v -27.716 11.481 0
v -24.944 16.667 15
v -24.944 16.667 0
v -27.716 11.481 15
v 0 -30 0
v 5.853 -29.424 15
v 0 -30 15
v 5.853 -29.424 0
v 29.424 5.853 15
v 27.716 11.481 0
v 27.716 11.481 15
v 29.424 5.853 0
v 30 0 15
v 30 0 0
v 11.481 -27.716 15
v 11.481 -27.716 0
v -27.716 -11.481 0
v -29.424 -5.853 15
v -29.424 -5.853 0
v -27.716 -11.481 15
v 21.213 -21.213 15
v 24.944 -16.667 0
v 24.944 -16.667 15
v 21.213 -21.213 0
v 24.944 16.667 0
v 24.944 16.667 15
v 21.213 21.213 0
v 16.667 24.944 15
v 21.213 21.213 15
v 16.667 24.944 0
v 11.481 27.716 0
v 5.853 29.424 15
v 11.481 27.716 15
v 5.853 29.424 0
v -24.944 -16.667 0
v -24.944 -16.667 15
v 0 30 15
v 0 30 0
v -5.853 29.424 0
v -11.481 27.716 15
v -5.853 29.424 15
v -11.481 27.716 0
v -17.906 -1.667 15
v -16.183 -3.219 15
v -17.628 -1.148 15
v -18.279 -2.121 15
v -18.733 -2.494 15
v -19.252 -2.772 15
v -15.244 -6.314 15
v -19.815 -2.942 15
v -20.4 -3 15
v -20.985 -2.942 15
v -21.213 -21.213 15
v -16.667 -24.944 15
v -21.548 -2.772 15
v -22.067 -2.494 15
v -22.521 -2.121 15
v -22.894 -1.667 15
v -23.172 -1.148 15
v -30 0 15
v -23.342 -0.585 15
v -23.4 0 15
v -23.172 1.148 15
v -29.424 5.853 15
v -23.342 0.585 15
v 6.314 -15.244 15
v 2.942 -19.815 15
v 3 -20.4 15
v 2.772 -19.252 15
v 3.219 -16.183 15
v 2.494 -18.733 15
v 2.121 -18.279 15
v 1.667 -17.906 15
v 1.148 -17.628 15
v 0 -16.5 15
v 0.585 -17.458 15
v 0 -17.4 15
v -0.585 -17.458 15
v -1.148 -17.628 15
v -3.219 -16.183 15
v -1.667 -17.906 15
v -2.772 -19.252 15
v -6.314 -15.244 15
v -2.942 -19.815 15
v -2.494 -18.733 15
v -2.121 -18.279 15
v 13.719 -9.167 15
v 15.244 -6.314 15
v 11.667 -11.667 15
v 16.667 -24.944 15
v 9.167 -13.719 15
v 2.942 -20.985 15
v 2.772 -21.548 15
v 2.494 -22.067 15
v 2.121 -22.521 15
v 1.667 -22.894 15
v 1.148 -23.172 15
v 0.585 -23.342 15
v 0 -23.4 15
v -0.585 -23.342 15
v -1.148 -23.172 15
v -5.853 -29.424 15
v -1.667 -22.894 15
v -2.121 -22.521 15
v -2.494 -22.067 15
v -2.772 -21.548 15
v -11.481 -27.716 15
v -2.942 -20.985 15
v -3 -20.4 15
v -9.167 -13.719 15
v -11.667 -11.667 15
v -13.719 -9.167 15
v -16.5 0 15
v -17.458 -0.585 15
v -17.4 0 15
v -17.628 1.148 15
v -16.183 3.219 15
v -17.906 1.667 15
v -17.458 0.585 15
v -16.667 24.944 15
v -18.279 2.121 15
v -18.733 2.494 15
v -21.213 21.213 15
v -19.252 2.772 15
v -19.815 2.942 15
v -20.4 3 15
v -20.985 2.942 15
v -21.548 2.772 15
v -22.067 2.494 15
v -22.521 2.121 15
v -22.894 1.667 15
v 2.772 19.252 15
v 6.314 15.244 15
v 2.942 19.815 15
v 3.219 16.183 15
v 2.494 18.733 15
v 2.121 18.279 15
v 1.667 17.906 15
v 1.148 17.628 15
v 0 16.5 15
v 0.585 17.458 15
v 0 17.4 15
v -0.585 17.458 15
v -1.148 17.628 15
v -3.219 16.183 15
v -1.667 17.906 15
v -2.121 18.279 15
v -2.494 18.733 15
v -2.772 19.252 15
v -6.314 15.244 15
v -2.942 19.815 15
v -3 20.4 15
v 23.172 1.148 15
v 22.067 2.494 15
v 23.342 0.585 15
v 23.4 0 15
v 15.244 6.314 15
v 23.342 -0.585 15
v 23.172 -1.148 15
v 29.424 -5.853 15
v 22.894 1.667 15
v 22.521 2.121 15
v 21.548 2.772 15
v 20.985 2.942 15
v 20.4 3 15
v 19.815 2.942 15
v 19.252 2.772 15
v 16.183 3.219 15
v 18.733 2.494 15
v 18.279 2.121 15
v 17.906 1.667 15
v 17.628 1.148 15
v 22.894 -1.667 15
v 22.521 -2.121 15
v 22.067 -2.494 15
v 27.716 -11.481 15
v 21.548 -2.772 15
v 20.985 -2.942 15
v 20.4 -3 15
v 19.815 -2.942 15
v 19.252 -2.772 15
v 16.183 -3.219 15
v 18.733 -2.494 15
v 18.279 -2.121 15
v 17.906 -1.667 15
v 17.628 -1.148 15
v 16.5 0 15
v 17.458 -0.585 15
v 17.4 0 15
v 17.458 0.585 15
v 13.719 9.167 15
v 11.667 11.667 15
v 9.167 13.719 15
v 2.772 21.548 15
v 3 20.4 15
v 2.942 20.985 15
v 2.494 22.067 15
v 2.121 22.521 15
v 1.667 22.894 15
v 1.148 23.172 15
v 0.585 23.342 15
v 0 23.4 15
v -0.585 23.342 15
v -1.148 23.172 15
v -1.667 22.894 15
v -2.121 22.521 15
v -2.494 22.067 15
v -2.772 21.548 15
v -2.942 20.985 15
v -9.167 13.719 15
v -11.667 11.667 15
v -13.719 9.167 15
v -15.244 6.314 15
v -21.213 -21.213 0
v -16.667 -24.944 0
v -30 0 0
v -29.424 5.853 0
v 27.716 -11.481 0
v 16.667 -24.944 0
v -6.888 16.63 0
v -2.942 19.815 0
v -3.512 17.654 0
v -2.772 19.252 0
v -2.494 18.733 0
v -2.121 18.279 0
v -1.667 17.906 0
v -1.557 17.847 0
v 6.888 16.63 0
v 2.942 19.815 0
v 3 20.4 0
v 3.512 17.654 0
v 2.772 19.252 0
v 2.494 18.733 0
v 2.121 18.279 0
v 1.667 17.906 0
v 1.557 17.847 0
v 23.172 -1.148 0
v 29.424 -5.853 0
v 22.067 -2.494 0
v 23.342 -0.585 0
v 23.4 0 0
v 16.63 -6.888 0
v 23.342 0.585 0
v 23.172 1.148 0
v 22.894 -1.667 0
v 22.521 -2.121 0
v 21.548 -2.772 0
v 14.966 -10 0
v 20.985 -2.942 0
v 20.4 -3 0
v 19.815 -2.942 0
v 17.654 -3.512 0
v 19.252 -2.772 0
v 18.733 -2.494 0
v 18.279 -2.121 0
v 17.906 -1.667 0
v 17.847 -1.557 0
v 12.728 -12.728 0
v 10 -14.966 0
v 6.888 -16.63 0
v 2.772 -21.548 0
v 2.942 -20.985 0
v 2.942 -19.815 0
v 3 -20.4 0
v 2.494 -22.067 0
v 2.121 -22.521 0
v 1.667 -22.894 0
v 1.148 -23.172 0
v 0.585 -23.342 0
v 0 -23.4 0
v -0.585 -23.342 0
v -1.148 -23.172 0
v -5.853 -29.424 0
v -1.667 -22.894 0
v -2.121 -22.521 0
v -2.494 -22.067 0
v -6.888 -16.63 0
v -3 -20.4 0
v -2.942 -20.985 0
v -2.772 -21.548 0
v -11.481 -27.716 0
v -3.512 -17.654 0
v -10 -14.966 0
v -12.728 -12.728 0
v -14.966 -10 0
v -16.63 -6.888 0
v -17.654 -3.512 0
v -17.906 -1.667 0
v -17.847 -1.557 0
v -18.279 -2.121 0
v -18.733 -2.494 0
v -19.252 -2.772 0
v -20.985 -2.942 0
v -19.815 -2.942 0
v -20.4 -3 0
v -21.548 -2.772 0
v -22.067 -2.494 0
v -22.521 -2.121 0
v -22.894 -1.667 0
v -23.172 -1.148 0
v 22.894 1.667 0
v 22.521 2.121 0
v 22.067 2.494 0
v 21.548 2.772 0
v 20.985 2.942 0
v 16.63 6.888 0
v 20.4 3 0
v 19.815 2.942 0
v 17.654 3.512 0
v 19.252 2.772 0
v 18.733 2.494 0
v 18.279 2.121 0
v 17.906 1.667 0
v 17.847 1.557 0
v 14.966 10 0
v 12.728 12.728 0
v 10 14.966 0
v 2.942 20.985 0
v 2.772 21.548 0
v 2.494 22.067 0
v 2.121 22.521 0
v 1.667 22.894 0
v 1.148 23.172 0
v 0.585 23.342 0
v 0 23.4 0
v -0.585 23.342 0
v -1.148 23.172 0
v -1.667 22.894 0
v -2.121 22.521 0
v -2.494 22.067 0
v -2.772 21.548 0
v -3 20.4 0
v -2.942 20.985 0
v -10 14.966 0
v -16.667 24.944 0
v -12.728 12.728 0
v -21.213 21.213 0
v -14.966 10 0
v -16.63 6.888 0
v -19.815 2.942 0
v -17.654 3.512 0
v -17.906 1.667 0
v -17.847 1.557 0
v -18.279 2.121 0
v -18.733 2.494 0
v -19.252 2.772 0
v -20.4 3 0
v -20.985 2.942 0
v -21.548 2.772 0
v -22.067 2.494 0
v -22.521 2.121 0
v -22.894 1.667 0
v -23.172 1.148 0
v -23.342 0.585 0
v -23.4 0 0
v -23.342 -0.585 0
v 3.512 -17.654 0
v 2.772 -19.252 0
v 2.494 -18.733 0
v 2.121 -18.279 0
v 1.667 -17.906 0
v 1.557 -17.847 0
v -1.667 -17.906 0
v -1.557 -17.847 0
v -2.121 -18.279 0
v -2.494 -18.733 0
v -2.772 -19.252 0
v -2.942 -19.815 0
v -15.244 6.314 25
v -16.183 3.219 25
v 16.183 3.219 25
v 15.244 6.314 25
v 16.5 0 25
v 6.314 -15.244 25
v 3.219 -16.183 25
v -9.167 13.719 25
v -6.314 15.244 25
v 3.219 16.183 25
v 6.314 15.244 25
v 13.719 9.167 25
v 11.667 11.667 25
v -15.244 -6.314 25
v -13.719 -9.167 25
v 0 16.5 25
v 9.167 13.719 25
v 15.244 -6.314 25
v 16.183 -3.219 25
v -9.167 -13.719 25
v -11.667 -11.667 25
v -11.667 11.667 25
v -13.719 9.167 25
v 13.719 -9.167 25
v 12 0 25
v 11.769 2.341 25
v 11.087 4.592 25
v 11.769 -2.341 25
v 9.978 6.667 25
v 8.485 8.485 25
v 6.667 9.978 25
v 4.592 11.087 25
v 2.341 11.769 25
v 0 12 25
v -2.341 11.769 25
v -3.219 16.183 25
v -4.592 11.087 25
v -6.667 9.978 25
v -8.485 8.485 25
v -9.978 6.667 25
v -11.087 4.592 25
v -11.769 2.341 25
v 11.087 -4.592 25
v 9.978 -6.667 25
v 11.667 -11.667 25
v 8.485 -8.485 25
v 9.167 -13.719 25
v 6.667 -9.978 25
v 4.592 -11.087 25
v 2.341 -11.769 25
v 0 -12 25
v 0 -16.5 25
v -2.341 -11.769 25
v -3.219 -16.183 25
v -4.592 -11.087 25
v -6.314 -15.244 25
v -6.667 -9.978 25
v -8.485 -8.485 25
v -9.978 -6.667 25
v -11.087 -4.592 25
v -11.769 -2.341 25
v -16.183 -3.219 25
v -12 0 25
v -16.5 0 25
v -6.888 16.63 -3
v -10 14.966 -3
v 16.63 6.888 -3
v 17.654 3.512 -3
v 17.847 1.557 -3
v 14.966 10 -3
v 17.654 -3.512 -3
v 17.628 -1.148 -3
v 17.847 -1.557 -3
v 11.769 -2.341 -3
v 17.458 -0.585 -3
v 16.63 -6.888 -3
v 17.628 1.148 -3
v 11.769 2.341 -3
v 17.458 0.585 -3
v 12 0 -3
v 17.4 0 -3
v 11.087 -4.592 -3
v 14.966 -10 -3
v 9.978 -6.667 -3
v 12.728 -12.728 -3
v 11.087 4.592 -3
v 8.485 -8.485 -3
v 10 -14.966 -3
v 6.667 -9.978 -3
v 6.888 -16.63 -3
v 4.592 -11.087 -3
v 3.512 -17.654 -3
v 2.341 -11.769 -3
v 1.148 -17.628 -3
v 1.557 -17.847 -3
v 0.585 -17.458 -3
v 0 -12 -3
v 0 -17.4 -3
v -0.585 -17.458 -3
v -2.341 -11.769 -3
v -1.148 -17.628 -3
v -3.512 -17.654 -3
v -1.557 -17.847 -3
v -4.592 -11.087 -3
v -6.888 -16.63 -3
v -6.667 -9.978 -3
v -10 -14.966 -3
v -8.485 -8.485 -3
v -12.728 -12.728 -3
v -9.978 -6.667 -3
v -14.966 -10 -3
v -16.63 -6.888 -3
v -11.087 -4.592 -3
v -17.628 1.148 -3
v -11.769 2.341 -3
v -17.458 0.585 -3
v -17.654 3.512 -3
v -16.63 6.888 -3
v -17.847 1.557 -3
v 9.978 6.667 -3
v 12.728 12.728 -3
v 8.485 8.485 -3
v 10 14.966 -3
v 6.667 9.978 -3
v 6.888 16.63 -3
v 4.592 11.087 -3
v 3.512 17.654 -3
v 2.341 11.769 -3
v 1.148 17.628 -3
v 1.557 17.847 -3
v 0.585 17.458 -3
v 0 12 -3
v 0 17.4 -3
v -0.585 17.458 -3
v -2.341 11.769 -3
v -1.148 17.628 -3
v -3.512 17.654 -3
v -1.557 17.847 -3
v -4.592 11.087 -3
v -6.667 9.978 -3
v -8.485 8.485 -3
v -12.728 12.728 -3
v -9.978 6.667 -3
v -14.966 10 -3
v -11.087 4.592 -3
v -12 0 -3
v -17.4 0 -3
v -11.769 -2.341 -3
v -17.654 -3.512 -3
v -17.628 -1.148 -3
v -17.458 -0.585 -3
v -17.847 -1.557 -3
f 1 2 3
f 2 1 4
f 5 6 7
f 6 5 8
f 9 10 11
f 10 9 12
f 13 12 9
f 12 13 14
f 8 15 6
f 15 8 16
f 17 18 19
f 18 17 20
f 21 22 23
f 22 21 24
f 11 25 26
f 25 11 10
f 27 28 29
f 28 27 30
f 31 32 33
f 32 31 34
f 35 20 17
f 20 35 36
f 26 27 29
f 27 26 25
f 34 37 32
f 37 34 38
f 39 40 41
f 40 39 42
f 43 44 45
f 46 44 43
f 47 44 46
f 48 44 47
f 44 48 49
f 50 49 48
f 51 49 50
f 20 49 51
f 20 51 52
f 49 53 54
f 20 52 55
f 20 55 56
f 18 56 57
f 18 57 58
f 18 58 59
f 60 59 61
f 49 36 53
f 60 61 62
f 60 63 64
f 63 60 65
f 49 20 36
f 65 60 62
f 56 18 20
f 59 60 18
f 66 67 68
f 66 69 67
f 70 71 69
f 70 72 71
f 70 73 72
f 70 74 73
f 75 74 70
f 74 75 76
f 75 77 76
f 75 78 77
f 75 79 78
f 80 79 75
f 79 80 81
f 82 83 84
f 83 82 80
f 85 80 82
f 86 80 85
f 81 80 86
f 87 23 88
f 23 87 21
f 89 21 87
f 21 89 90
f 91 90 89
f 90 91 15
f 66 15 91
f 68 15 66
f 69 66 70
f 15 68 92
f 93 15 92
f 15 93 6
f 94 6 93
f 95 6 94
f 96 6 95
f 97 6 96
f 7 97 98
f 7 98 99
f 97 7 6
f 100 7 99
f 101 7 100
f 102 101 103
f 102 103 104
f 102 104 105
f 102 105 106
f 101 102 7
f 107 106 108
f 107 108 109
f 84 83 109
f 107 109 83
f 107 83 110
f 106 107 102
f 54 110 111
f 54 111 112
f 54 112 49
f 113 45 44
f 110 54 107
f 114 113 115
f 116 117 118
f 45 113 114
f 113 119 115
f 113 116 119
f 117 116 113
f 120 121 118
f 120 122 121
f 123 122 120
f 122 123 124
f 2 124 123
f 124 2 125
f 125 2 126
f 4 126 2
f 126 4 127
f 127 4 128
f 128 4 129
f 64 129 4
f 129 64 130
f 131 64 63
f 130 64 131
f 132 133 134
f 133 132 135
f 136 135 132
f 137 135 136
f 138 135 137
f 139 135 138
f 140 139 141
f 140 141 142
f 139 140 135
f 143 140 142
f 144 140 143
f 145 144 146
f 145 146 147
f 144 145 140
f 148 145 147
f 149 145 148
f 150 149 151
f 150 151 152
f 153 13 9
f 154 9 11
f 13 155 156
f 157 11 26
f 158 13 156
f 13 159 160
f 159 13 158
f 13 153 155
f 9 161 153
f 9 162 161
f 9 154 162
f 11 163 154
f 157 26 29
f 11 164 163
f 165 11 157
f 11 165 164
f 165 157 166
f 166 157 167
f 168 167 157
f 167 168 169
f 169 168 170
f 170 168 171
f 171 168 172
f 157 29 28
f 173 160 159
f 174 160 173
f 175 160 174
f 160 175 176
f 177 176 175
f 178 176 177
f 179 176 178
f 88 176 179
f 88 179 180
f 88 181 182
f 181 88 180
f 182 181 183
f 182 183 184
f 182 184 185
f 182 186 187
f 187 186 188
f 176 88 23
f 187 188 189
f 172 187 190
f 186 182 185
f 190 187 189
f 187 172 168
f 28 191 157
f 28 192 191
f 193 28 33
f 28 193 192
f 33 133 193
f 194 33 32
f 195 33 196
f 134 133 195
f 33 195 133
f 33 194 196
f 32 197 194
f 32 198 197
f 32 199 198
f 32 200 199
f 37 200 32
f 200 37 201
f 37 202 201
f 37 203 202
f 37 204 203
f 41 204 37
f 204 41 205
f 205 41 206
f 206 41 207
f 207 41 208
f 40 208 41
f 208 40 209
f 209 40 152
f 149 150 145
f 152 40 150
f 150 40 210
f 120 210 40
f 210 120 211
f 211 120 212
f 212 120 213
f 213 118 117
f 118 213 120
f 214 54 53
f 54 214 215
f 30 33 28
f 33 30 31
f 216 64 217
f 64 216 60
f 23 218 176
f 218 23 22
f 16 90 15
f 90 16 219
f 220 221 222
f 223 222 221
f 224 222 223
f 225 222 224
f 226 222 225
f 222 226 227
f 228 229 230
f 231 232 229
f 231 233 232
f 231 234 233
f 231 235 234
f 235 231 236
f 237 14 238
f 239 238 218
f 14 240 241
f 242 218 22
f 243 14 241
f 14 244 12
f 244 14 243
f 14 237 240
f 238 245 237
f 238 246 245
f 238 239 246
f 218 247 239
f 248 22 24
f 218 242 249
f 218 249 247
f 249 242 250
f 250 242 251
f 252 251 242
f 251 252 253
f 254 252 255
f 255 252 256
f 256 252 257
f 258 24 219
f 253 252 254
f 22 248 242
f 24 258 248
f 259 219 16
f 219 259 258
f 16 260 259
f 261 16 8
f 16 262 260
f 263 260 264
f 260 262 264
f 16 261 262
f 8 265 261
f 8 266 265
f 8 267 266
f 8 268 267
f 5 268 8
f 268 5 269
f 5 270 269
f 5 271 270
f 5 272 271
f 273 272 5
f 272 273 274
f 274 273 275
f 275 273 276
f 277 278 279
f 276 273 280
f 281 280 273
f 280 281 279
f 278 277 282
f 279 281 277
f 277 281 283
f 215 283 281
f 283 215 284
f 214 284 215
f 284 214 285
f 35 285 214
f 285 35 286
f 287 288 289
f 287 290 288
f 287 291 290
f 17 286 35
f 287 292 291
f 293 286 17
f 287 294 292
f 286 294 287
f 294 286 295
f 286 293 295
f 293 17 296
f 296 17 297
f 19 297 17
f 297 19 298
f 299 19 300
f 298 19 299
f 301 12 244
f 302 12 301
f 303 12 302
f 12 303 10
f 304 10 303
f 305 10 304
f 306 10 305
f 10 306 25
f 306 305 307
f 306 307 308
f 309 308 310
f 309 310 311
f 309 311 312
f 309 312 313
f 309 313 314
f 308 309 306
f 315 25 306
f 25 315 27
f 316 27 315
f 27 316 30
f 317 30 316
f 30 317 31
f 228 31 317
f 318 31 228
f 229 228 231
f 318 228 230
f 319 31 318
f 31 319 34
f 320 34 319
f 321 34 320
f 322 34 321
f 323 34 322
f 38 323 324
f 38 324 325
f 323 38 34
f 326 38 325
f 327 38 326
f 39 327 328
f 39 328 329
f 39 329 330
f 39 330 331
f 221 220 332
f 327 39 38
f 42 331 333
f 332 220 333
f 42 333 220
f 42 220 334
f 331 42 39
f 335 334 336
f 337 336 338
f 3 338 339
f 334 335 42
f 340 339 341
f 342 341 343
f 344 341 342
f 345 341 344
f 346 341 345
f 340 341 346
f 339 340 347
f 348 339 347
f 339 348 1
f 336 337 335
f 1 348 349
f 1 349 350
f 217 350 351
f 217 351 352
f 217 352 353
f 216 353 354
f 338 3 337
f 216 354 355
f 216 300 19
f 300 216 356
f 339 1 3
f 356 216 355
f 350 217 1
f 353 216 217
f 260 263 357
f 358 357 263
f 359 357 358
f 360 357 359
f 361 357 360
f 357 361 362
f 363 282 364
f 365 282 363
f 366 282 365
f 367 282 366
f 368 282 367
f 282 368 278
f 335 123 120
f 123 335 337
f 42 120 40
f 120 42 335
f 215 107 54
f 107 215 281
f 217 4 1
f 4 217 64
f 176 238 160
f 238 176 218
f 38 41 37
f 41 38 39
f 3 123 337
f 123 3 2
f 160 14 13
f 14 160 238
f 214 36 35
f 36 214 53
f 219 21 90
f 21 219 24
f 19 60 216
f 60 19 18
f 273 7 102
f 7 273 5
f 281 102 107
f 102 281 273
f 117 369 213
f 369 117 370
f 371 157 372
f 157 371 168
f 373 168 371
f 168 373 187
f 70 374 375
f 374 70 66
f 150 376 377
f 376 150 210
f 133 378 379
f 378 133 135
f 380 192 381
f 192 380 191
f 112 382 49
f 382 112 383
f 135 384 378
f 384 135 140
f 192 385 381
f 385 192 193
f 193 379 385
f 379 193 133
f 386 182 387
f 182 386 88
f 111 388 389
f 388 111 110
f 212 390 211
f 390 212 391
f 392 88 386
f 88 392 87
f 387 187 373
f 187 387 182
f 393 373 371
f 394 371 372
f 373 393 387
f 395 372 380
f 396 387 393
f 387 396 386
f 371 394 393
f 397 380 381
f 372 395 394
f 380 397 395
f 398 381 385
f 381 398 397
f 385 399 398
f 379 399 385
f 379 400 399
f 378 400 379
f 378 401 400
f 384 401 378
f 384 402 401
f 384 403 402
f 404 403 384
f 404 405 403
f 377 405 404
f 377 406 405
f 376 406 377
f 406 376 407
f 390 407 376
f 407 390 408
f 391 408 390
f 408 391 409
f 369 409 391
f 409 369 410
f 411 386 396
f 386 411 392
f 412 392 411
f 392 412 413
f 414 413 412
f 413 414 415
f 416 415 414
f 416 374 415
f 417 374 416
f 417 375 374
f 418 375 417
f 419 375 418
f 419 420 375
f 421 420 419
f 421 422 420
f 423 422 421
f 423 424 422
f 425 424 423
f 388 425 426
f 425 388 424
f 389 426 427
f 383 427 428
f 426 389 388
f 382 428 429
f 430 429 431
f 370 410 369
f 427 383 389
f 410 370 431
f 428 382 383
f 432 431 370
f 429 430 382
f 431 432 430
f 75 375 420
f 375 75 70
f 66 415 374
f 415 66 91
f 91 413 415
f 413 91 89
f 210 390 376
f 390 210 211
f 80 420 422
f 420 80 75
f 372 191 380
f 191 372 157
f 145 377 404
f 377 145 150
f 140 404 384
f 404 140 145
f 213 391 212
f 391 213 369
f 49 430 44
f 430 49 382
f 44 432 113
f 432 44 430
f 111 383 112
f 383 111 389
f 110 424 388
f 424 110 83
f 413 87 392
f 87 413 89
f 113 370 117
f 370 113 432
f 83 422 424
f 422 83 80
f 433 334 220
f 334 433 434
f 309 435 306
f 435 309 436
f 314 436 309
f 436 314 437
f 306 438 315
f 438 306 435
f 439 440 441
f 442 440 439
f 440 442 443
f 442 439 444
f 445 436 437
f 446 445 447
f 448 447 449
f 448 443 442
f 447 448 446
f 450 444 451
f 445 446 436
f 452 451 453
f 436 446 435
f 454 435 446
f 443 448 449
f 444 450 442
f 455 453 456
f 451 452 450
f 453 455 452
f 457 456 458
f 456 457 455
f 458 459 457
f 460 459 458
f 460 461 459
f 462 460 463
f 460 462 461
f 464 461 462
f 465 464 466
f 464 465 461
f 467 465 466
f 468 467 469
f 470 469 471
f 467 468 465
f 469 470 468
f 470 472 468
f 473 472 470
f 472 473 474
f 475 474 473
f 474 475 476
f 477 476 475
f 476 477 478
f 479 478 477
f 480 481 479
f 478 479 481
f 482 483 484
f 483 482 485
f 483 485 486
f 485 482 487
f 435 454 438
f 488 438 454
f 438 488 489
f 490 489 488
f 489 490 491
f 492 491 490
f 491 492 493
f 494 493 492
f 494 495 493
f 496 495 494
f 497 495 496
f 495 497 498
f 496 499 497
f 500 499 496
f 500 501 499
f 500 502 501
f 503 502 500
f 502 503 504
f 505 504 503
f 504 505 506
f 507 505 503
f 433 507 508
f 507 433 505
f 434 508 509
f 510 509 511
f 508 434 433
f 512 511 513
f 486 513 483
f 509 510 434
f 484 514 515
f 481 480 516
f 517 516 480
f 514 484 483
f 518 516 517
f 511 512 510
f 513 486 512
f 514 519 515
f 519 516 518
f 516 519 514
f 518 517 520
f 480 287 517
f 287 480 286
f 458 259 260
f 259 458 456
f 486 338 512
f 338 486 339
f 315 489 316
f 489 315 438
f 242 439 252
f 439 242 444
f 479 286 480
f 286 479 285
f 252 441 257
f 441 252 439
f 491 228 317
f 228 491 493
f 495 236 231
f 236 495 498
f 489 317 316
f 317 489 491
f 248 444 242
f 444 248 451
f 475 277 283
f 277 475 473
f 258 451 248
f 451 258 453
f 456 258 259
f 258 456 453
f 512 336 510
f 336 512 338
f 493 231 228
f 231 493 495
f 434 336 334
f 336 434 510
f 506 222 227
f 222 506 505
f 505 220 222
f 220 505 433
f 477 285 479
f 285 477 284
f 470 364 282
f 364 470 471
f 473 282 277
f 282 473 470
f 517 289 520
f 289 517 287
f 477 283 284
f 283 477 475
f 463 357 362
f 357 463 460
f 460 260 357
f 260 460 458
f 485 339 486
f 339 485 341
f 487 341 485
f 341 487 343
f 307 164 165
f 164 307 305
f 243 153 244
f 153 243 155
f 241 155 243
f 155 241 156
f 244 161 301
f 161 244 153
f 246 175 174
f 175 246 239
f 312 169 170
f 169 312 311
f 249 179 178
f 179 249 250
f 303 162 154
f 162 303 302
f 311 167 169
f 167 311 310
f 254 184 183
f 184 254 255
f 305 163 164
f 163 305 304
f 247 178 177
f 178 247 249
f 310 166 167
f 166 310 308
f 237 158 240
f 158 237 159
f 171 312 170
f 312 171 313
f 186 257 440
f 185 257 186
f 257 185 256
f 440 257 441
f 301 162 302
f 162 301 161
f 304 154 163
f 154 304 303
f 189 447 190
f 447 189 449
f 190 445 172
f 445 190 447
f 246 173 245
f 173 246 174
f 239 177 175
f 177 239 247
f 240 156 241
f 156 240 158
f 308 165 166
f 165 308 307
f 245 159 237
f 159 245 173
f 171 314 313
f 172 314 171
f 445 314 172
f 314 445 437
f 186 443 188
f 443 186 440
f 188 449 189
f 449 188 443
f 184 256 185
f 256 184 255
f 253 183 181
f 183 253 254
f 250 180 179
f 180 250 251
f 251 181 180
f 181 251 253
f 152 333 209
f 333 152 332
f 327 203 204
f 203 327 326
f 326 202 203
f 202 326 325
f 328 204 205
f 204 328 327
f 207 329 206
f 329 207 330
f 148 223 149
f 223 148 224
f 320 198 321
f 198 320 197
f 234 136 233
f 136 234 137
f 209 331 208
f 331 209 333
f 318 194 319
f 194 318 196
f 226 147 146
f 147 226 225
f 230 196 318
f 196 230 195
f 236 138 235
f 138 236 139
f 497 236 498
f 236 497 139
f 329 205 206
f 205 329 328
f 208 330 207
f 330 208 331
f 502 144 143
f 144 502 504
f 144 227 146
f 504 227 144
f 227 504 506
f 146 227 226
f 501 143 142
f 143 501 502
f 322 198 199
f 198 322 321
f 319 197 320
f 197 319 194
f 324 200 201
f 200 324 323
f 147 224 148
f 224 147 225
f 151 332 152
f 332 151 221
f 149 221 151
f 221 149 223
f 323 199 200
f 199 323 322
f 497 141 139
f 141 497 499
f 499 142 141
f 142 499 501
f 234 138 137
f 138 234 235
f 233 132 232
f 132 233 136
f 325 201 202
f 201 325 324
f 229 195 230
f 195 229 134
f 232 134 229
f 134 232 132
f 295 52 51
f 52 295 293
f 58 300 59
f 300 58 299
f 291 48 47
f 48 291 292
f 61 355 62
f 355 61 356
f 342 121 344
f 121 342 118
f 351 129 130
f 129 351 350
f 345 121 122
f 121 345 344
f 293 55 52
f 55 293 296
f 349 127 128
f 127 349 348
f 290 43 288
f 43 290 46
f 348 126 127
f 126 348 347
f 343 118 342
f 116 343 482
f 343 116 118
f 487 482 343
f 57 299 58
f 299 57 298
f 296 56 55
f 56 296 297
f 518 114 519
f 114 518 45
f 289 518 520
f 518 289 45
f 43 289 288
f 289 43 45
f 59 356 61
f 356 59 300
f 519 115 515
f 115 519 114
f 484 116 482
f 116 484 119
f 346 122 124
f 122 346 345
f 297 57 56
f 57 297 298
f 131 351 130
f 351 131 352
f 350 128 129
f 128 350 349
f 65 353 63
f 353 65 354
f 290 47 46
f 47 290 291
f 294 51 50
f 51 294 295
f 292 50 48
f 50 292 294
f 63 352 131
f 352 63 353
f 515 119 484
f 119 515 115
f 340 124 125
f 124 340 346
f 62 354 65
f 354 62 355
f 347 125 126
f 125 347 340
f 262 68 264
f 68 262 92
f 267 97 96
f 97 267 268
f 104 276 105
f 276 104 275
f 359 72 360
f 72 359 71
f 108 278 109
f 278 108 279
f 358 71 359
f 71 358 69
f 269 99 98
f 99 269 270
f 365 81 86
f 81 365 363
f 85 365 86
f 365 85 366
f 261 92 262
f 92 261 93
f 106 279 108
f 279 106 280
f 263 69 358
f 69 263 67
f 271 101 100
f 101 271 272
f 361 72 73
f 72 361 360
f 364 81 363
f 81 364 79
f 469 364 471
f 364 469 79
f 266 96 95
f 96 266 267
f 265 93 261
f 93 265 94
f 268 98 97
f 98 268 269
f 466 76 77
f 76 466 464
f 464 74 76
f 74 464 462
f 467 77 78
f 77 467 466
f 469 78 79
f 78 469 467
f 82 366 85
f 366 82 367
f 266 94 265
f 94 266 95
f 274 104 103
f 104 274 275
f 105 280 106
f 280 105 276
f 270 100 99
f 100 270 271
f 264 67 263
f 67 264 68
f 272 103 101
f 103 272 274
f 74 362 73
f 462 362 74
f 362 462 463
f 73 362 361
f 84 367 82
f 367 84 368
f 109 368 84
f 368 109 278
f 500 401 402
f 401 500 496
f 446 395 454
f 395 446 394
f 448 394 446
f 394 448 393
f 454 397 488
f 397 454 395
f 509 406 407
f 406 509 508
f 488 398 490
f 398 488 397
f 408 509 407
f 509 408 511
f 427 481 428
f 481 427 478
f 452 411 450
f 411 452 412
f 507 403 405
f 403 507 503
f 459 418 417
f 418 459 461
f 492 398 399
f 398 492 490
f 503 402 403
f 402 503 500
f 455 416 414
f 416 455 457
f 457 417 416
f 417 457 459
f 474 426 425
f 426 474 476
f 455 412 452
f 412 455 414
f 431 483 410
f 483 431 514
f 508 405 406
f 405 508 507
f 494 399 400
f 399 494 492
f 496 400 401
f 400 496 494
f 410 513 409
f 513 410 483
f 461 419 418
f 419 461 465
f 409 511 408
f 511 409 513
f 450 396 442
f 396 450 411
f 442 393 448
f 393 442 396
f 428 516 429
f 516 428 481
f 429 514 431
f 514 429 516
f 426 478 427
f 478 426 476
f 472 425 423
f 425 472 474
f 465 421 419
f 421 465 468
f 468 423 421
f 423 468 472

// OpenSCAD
$fn = 32;

// ----------------------------------------------------------------------
// Bolt-circle flange: 60 mm outside, 4 bolt holes, bore 24 mm
// ----------------------------------------------------------------------

// --- parameters (mm) ---
flange_d = 60;            // flange outside diameter
flange_t = 15;            // flange thickness
bolts = 4;                // number of bolt holes
bolt_d = 6;               // bolt clearance
bolt_r = 20.4;            // bolt circle radius
bore_d = 24;              // centre bore
hub_d = 33;               // raised hub diameter
hub_h = 10;               // raised hub height
spigot_d = 36;            // spigot diameter
spigot_h = 4;             // spigot height below the flange
sink = 1;                 // overlap into the flange

module body() {
  cylinder(h = flange_t, d = flange_d);
  /* raised hub, sunk 1 mm into the flange */
  translate([0, 0, flange_t - 1]) cylinder(h = hub_h + 1, d = hub_d);
  /* spigot on the back face, sunk into the flange */
  translate([0, 0, -spigot_h + sink]) cylinder(h = spigot_h, d = spigot_d);
}

difference() {
  body();
  /* bolt circle */
  for (i = [0 : bolts - 1]) rotate([0, 0, i * 360 / bolts]) translate([bolt_r, 0, -spigot_h - 1]) cylinder(h = flange_t + hub_h + spigot_h + 3, d = bolt_d);
  translate([0, 0, -spigot_h - 1]) cylinder(h = flange_t + hub_h + spigot_h + 3, d = bore_d);
}
